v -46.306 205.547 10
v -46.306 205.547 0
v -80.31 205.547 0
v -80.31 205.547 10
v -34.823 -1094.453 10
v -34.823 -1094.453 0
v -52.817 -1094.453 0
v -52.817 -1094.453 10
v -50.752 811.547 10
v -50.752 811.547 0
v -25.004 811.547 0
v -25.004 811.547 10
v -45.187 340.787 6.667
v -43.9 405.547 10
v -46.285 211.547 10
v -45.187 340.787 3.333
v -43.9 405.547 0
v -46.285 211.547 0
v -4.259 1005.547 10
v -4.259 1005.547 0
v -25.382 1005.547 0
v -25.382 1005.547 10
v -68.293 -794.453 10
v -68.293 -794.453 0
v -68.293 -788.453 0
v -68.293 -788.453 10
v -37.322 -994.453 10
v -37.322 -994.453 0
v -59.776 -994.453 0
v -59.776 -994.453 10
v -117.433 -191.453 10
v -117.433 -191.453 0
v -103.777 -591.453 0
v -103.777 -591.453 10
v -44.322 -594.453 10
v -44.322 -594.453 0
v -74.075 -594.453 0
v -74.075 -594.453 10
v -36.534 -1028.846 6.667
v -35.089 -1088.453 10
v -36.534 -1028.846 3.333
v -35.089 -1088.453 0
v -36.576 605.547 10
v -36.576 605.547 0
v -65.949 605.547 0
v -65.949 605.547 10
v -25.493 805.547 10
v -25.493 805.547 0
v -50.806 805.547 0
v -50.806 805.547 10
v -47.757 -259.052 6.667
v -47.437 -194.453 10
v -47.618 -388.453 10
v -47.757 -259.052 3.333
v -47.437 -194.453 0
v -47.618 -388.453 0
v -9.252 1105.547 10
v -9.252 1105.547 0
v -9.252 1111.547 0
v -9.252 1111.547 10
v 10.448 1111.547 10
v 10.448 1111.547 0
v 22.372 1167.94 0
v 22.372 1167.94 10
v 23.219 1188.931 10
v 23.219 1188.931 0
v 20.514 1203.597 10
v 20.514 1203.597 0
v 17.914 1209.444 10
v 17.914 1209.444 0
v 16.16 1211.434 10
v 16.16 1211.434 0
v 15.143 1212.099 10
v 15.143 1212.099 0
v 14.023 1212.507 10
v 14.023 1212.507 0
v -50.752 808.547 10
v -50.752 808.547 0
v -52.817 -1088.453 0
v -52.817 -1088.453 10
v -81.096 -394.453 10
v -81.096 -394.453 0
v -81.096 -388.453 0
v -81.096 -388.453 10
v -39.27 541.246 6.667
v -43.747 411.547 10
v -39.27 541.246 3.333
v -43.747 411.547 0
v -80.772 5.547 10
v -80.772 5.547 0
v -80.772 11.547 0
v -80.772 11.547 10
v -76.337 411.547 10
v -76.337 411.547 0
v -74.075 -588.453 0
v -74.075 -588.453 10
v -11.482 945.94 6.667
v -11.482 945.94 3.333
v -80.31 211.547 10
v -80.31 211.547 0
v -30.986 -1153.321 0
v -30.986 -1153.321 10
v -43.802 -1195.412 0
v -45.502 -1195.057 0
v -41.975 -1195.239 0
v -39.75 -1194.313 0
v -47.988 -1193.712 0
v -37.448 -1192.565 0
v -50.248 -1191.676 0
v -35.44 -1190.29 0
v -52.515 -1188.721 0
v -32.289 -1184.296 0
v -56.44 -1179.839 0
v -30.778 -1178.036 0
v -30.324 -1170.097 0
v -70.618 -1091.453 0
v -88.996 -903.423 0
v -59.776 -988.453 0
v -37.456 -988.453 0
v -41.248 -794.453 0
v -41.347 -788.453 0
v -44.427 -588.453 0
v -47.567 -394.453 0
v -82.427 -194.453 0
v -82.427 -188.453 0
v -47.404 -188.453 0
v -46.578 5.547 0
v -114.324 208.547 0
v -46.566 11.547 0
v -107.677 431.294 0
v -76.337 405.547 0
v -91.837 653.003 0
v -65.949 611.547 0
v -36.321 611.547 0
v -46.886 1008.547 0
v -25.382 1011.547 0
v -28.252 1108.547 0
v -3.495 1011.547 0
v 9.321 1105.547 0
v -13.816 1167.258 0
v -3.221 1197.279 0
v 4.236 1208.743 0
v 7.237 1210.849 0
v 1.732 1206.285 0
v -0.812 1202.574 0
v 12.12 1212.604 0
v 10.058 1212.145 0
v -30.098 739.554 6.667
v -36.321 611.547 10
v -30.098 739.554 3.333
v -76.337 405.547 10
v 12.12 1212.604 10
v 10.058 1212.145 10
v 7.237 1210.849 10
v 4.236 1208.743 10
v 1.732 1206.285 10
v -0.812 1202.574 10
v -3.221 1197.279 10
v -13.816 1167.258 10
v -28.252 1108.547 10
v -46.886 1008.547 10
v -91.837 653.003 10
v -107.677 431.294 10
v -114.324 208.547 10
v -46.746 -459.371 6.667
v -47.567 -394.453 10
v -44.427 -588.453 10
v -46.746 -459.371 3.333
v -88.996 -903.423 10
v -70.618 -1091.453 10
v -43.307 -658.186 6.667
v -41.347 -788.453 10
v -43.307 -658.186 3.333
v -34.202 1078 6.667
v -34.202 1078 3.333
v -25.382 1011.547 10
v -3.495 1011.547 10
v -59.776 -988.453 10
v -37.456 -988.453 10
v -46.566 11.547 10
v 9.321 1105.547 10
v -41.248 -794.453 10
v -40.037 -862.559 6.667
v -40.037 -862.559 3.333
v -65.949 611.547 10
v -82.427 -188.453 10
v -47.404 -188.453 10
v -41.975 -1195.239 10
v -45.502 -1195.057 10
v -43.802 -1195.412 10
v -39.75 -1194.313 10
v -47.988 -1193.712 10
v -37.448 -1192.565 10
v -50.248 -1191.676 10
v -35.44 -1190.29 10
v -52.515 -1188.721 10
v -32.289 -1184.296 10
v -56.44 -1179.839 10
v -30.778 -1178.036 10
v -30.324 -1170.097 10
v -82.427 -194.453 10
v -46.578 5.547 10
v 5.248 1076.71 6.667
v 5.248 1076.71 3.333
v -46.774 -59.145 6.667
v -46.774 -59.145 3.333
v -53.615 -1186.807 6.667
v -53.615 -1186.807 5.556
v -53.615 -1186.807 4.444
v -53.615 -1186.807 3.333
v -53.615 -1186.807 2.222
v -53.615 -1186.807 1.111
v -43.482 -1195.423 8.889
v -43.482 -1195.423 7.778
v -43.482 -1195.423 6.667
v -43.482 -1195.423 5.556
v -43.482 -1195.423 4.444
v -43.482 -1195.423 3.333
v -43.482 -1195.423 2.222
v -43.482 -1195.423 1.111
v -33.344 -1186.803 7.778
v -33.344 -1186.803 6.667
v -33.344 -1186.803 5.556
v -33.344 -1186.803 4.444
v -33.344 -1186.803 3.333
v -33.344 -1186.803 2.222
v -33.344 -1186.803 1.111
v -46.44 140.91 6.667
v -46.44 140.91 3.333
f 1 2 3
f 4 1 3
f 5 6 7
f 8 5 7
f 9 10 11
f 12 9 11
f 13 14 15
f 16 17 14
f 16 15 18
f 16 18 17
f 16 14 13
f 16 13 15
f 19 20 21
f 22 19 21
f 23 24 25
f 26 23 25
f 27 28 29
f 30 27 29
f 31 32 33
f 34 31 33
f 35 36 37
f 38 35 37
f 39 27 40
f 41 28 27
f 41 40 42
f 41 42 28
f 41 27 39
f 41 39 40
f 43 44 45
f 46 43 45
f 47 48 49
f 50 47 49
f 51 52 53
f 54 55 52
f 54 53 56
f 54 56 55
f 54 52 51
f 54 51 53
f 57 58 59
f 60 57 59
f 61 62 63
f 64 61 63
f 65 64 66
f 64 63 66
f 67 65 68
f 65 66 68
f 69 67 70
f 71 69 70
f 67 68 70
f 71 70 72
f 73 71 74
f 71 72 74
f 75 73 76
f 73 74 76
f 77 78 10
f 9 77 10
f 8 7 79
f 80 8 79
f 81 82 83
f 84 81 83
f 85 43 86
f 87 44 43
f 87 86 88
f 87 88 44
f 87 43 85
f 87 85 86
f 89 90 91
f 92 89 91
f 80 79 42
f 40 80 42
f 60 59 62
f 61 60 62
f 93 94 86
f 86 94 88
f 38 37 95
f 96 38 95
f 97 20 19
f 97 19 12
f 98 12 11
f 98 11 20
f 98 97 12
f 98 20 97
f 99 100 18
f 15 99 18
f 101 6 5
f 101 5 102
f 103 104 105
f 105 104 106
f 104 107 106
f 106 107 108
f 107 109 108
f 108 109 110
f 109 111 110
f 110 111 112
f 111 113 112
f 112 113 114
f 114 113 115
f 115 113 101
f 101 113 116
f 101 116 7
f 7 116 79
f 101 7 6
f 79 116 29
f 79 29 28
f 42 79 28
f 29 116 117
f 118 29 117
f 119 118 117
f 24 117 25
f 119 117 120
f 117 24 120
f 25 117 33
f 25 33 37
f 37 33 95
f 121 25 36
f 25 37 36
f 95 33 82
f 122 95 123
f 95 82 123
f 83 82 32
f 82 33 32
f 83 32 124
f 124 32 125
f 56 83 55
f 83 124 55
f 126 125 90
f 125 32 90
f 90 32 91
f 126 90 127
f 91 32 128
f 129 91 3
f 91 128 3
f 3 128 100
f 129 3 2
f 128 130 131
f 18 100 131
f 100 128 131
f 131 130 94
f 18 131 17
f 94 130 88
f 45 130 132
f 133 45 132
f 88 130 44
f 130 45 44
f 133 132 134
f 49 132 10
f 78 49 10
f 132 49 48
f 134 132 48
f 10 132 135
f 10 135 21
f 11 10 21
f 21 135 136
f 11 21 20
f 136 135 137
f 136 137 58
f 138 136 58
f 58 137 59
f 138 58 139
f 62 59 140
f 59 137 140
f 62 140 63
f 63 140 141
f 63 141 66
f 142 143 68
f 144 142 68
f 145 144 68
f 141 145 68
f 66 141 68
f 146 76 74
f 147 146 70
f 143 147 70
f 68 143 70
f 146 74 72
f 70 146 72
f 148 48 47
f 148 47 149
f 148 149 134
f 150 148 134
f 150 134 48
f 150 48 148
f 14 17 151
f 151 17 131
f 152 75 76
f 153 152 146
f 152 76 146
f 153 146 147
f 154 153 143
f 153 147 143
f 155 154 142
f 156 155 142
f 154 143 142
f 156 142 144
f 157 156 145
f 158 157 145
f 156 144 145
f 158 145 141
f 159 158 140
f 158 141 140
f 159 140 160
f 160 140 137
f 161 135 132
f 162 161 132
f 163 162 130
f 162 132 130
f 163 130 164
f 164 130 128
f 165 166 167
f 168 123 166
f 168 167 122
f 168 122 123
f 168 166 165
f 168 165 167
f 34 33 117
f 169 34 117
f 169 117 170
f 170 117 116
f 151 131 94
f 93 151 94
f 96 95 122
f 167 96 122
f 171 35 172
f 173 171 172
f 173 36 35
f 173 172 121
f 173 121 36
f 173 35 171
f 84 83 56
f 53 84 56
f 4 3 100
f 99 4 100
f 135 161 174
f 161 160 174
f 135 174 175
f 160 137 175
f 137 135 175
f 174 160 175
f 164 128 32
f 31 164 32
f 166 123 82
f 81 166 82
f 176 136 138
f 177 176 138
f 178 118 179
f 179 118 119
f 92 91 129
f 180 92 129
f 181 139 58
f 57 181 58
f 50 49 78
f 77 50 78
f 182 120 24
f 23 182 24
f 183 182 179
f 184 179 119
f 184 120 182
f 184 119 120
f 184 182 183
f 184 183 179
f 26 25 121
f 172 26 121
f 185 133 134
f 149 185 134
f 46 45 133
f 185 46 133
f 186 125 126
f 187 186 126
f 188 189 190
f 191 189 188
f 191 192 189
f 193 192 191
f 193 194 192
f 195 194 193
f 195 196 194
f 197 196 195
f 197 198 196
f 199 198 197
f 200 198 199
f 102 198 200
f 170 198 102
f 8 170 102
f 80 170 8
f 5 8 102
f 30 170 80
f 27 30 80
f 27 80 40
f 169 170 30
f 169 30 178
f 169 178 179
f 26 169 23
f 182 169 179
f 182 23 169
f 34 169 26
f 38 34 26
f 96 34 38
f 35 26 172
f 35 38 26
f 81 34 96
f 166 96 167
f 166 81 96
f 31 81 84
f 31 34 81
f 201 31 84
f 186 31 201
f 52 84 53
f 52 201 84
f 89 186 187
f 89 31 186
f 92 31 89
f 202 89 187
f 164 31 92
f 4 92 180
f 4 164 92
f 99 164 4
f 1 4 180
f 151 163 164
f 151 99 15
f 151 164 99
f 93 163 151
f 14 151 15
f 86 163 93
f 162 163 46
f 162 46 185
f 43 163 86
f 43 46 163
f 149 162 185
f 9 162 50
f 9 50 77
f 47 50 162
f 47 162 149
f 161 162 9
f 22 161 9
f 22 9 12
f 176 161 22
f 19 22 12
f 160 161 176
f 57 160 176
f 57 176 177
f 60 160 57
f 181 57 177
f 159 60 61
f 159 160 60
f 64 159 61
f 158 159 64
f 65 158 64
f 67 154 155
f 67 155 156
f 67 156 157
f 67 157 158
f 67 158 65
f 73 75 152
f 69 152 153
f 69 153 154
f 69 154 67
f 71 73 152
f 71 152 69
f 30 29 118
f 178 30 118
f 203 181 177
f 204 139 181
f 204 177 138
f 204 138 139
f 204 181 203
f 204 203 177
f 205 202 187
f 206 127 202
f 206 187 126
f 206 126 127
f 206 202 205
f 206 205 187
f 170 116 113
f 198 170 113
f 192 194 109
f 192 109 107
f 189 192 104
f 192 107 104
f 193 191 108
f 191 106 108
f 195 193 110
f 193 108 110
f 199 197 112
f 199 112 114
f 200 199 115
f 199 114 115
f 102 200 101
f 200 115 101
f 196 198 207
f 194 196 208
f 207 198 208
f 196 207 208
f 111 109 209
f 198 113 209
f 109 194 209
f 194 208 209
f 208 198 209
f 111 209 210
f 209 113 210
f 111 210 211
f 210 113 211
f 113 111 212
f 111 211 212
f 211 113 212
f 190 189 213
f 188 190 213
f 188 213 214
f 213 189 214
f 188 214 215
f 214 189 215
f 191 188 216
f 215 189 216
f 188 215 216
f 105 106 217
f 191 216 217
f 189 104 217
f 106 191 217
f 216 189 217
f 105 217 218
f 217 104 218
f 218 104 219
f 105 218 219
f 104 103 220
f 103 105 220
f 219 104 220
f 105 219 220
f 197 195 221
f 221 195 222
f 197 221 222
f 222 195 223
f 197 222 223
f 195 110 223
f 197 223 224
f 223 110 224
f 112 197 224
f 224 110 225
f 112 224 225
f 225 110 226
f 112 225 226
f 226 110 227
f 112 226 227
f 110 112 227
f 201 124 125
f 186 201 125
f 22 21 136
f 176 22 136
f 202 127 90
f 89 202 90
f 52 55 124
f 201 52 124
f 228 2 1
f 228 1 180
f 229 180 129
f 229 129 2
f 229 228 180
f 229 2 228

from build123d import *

# Parameters (mm, degrees)
F1_DEPTH = 10


# Not quite as in the source:
# - a feature names something its author has since deleted; it is built from what else it names


with BuildPart() as f1:
    # F0 (on Top) → F1 (new body)
    with BuildSketch(Plane.XY):
        with BuildLine():
            Line((-9.2522319783, 1105.5465694817), (-9.2522319783, 1108.5465694817))
            Line((-9.2522319783, 1108.5465694817), (-28.2522319783, 1108.5465694817))
            add(Edge.make_bspline(
                [(-28.2522319783, 1108.5465694817), (-34.1692287273, 1078.3481872981), (-40.0862254764, 1048.1498051145), (-46.885506853, 1008.5465694817)],
                knots=[0, 0, 0, 0, 0.0623728759, 0.0623728759, 0.0623728759, 0.0623728759], degree=3))
            Line((-46.885506853, 1008.5465694817), (-25.3817387583, 1008.5465694817))
            Line((-25.3817387583, 1008.5465694817), (-25.3817387583, 1011.5465694817))
            Line((-25.3817387583, 1011.5465694817), (-3.4951998214, 1011.5465694817))
            add(Edge.make_bspline(
                [(9.3214260817, 1105.5465694817), (5.2778951966, 1077.0910022719), (1.2125502532, 1048.3609188135), (-3.4951998214, 1011.5465694817)],
                knots=[0.0020582204, 0.0020582204, 0.0020582204, 0.0020582204, 0.0606128099, 0.0606128099, 0.0606128099, 0.0606128099], degree=3))
            Line((9.3214260817, 1105.5465694817), (-9.2522319783, 1105.5465694817))
        make_face()
        with BuildLine():
            Line((-28.2522319783, 1108.5465694817), (-9.2522319783, 1108.5465694817))
            Line((-9.2522319783, 1108.5465694817), (-9.2522319783, 1111.5465694817))
            Line((-9.2522319783, 1111.5465694817), (10.4483753261, 1111.5465694817))
            add(Edge.make_bspline(
                [(10.4483753261, 1111.5465694817), (14.2237569857, 1127.7176279013), (20.7843357368, 1156.0283342705), (24.50141426, 1181.1497468298), (21.913351831, 1202.3721726285), (17.2535020339, 1211.7645420112), (14.0231014783, 1212.5065694817)],
                knots=[0.0100141442, 0.0100141442, 0.0100141442, 0.0100141442, 0.1720322765, 0.2970501568, 0.4103591472, 0.4934759383, 0.4934759383, 0.4934759383, 0.4934759383], degree=3))
            add(Edge.make_bspline(
                [(14.0231014783, 1212.5065694817), (10.6916463361, 1213.2718093304), (0.9849483202, 1207.717065294), (-4.4652508998, 1194.4970040922), (-17.4495437423, 1158.8703779353), (-24.4328369098, 1126.3390394336), (-28.2522319783, 1108.5465694817)],
                knots=[0.4934759383, 0.4934759383, 0.4934759383, 0.4934759383, 0.5791928197, 0.6716390479, 0.8204084848, 1, 1, 1, 1], degree=3))
        make_face()
        with BuildLine():
            Line((-25.3817387583, 1008.5465694817), (-46.885506853, 1008.5465694817))
            add(Edge.make_bspline(
                [(-46.885506853, 1008.5465694817), (-56.4704307745, 952.7180223817), (-67.8086700034, 878.1997316325), (-76.2546409025, 808.5465694817)],
                knots=[0.0623728759, 0.0623728759, 0.0623728759, 0.0623728759, 0.1502997077, 0.1502997077, 0.1502997077, 0.1502997077], degree=3))
            Line((-76.2546409025, 808.5465694817), (-50.7523337375, 808.5465694817))
            Line((-50.7523337375, 808.5465694817), (-50.7523337375, 811.5465694817))
            Line((-50.7523337375, 811.5465694817), (-25.0042987138, 811.5465694817))
            add(Edge.make_bspline(
                [(-4.2590252459, 1005.5465694817), (-11.1919357354, 950.8419950912), (-19.4396527515, 879.0589079331), (-25.0042987138, 811.5465694817)],
                knots=[0.0637563334, 0.0637563334, 0.0637563334, 0.0637563334, 0.1487347177, 0.1487347177, 0.1487347177, 0.1487347177], degree=3))
            Line((-4.2590252459, 1005.5465694817), (-25.3817387583, 1005.5465694817))
            Line((-25.3817387583, 1005.5465694817), (-25.3817387583, 1008.5465694817))
        make_face()
        with BuildLine():
            Line((-50.7523337375, 808.5465694817), (-76.2546409025, 808.5465694817))
            add(Edge.make_bspline(
                [(-76.2546409025, 808.5465694817), (-84.6749646264, 739.1049172777), (-90.2205587707, 674.4988914733), (-95.4501271993, 608.5465694817)],
                knots=[0.1502997077, 0.1502997077, 0.1502997077, 0.1502997077, 0.2379595395, 0.2379595395, 0.2379595395, 0.2379595395], degree=3))
            Line((-95.4501271993, 608.5465694817), (-65.9492915816, 608.5465694817))
            Line((-65.9492915816, 608.5465694817), (-65.9492915816, 611.5465694817))
            Line((-65.9492915816, 611.5465694817), (-36.3208296657, 611.5465694817))
            add(Edge.make_bspline(
                [(-25.492600007, 805.5470480317), (-30.8991386303, 738.261256599), (-33.600522451, 675.484027067), (-36.3208296657, 611.5465694817)],
                knots=[0.1512568673, 0.1512568673, 0.1512568673, 0.1512568673, 0.2362855612, 0.2362855612, 0.2362855612, 0.2362855612], degree=3))
            Line((-25.492600007, 805.5470480317), (-50.8059161147, 805.5470480317))
            Line((-50.8059161147, 805.5470480317), (-50.7523337375, 808.5465694817))
        make_face()
        with BuildLine():
            Line((-65.9492915816, 608.5465694817), (-95.4501271993, 608.5465694817))
            add(Edge.make_bspline(
                [(-95.4501271993, 608.5465694817), (-100.6735657013, 542.6715546134), (-105.5817189232, 475.4533978756), (-108.8488180837, 408.5465694817)],
                knots=[0.2379595395, 0.2379595395, 0.2379595395, 0.2379595395, 0.3255166193, 0.3255166193, 0.3255166193, 0.3255166193], degree=3))
            Line((-108.8488180837, 408.5465694817), (-76.3366638949, 408.5465694817))
            Line((-76.3366638949, 408.5465694817), (-76.3366638949, 411.5465694817))
            Line((-76.3366638949, 411.5465694817), (-43.7472965242, 411.5465694817))
            add(Edge.make_bspline(
                [(-36.576081022, 605.5465694817), (-39.2965672487, 541.5968769288), (-42.0608997966, 476.4245488132), (-43.7472965243, 411.5465694817)],
                knots=[0.2389437345, 0.2389437345, 0.2389437345, 0.2389437345, 0.3238872962, 0.3238872962, 0.3238872962, 0.3238872962], degree=3))
            Line((-36.576081022, 605.5465694817), (-65.9492915816, 605.5465694817))
            Line((-65.9492915816, 605.5465694817), (-65.9492915816, 608.5465694817))
        make_face()
        with BuildLine():
            Line((-76.3366638949, 408.5465694817), (-108.8488180837, 408.5465694817))
            add(Edge.make_bspline(
                [(-108.8488180837, 408.5465694817), (-112.112873039, 341.7020832768), (-113.7389306982, 275.1683455095), (-114.3242902488, 208.5465694817)],
                knots=[0.3255166193, 0.3255166193, 0.3255166193, 0.3255166193, 0.4129921155, 0.4129921155, 0.4129921155, 0.4129921155], degree=3))
            Line((-114.3242902488, 208.5465694817), (-80.310060953, 208.5465694817))
            Line((-80.310060953, 208.5465694817), (-80.310060953, 211.5465694817))
            Line((-80.310060953, 211.5465694817), (-46.2853714025, 211.5465694817))
            add(Edge.make_bspline(
                [(-43.9001795453, 405.5465694817), (-45.519256644, 340.6971675299), (-46.0554016999, 276.1594412286), (-46.2853714025, 211.5465694817)],
                knots=[0.3265062426, 0.3265062426, 0.3265062426, 0.3265062426, 0.4114374445, 0.4114374445, 0.4114374445, 0.4114374445], degree=3))
            Line((-43.9001795453, 405.5465694817), (-76.3366638949, 405.5465694817))
            Line((-76.3366638949, 405.5465694817), (-76.3366638949, 408.5465694817))
        make_face()
        with BuildLine():
            Line((-80.310060953, 208.5465694817), (-114.3242902488, 208.5465694817))
            add(Edge.make_bspline(
                [(-114.3242902488, 208.5465694817), (-114.9095417049, 141.9370960513), (-114.4544793743, 75.2396168723), (-114.9729122534, 8.5465694817)],
                knots=[0.4129921155, 0.4129921155, 0.4129921155, 0.4129921155, 0.5004514582, 0.5004514582, 0.5004514582, 0.5004514582], degree=3))
            Line((-114.9729122534, 8.5465694817), (-80.772249135, 8.5465694817))
            Line((-80.772249135, 8.5465694817), (-80.772249135, 11.5465694817))
            Line((-80.772249135, 11.5465694817), (-46.5657327214, 11.5465694817))
            add(Edge.make_bspline(
                [(-46.3058677148, 205.5465694817), (-46.517541999, 140.9336478574), (-46.4426078998, 76.2408210046), (-46.5657327214, 11.5465694817)],
                knots=[0.4140662707, 0.4140662707, 0.4140662707, 0.4140662707, 0.4989910833, 0.4989910833, 0.4989910833, 0.4989910833], degree=3))
            Line((-46.3058677148, 205.5465694817), (-80.310060953, 205.5465694817))
            Line((-80.310060953, 205.5465694817), (-80.310060953, 208.5465694817))
        make_face()
        with BuildLine():
            Line((-80.772249135, 8.5465694817), (-114.9729122534, 8.5465694817))
            add(Edge.make_bspline(
                [(-114.9729122534, 8.5465694817), (-115.4913633728, -58.1488243975), (-116.9833782047, -124.8397861765), (-117.4326707445, -191.4534305183)],
                knots=[0.5004514582, 0.5004514582, 0.5004514582, 0.5004514582, 0.587913878, 0.587913878, 0.587913878, 0.587913878], degree=3))
            Line((-117.4326707445, -191.4534305183), (-82.4265356335, -191.4534305183))
            Line((-82.4265356335, -191.4534305183), (-82.4265356335, -188.4534305183))
            Line((-82.4265356335, -188.4534305183), (-47.4040323866, -188.4534305183))
            add(Edge.make_bspline(
                [(-46.5777314963, 5.5465694817), (-46.7134050172, -59.1479448978), (-47.0517150176, -123.8414273541), (-47.4040323866, -188.4534305183)],
                knots=[0.5016165032, 0.5016165032, 0.5016165032, 0.5016165032, 0.5865416442, 0.5865416442, 0.5865416442, 0.5865416442], degree=3))
            Line((-46.5777314963, 5.5465694817), (-80.772249135, 5.5465694817))
            Line((-80.772249135, 5.5465694817), (-80.772249135, 8.5465694817))
        make_face()
        with BuildLine():
            Line((-82.4265356335, -191.4534305183), (-117.4326707445, -191.4534305183))
            add(Edge.make_bspline(
                [(-117.4326707445, -191.4534305183), (-117.8819688578, -258.0679012195), (-117.2885188084, -324.6050525653), (-114.5979590791, -391.4534305183)],
                knots=[0.587913878, 0.587913878, 0.587913878, 0.587913878, 0.6753773828, 0.6753773828, 0.6753773828, 0.6753773828], degree=3))
            Line((-114.5979590791, -391.4534305183), (-81.0956338475, -391.4534305183))
            Line((-81.0956338475, -391.4534305183), (-81.0956338475, -388.4534305183))
            Line((-81.0956338475, -388.4534305183), (-47.6180785507, -388.4534305183))
            add(Edge.make_bspline(
                [(-47.4367827083, -194.4534305183), (-47.7896354912, -259.0626621028), (-48.1401096643, -323.5953829529), (-47.6180785507, -388.4534305183)],
                knots=[0.58917052, 0.58917052, 0.58917052, 0.58917052, 0.6740985981, 0.6740985981, 0.6740985981, 0.6740985981], degree=3))
            Line((-47.4367827083, -194.4534305183), (-82.4265356335, -194.4534305183))
            Line((-82.4265356335, -194.4534305183), (-82.4265356335, -191.4534305183))
        make_face()
        with BuildLine():
            Line((-81.0956338475, -391.4534305183), (-114.5979590791, -391.4534305183))
            add(Edge.make_bspline(
                [(-114.5979590791, -391.4534305183), (-111.9055675807, -458.347319741), (-107.1132099499, -525.5528594896), (-103.7767332928, -591.4534305183)],
                knots=[0.6753773828, 0.6753773828, 0.6753773828, 0.6753773828, 0.762900434, 0.762900434, 0.762900434, 0.762900434], degree=3))
            Line((-103.7767332928, -591.4534305183), (-74.0754674311, -591.4534305183))
            Line((-74.0754674311, -591.4534305183), (-74.0754674311, -588.4534305183))
            Line((-74.0754674311, -588.4534305183), (-44.426569062, -588.4534305183))
            add(Edge.make_bspline(
                [(-47.5672869388, -394.4534305183), (-46.9911709166, -459.3253273899), (-45.5476453008, -524.5049596078), (-44.426569062, -588.4534305183)],
                knots=[0.6767170821, 0.6767170821, 0.6767170821, 0.6767170821, 0.7616371329, 0.7616371329, 0.7616371329, 0.7616371329], degree=3))
            Line((-47.5672869388, -394.4534305183), (-81.0956338475, -394.4534305183))
            Line((-81.0956338475, -394.4534305183), (-81.0956338475, -391.4534305183))
        make_face()
        with BuildLine():
            Line((-74.0754674311, -591.4534305183), (-103.7767332928, -591.4534305183))
            add(Edge.make_bspline(
                [(-103.7767332928, -591.4534305183), (-100.4411938204, -657.3354907033), (-98.5607175504, -721.913315172), (-95.2888672995, -791.4534305183)],
                knots=[0.762900434, 0.762900434, 0.762900434, 0.762900434, 0.8503989007, 0.8503989007, 0.8503989007, 0.8503989007], degree=3))
            Line((-95.2888672995, -791.4534305183), (-68.2934120383, -791.4534305183))
            Line((-68.2934120383, -791.4534305183), (-68.2934120383, -788.4534305183))
            Line((-68.2934120383, -788.4534305183), (-41.3473226027, -788.4534305183))
            add(Edge.make_bspline(
                [(-44.3222964296, -594.4534305183), (-43.2214963704, -658.360909415), (-42.4517270587, -721.1021087734), (-41.3473226027, -788.4534305183)],
                knots=[0.7642946324, 0.7642946324, 0.7642946324, 0.7642946324, 0.8492622563, 0.8492622563, 0.8492622563, 0.8492622563], degree=3))
            Line((-44.3222964296, -594.4534305183), (-74.0754674311, -594.4534305183))
            Line((-74.0754674311, -594.4534305183), (-74.0754674311, -591.4534305183))
        make_face()
        with BuildLine():
            Line((-68.2934120383, -791.4534305183), (-95.2888672995, -791.4534305183))
            add(Edge.make_bspline(
                [(-95.2888672995, -791.4534305183), (-92.0149726534, -861.0369975725), (-87.3479647004, -935.5890587547), (-82.1628302646, -991.4534305183)],
                knots=[0.8503989007, 0.8503989007, 0.8503989007, 0.8503989007, 0.9379520403, 0.9379520403, 0.9379520403, 0.9379520403], degree=3))
            Line((-82.1628302646, -991.4534305183), (-59.7760454191, -991.4534305183))
            Line((-59.7760454191, -991.4534305183), (-59.7760454191, -988.4534305183))
            Line((-59.7760454191, -988.4534305183), (-37.4559647617, -988.4534305183))
            add(Edge.make_bspline(
                [(-41.2482418592, -794.4534305183), (-40.1266287573, -861.9004781348), (-38.6708390195, -933.7012026364), (-37.4559647617, -988.4534305183)],
                knots=[0.8517802395, 0.8517802395, 0.8517802395, 0.8517802395, 0.9365259774, 0.9365259774, 0.9365259774, 0.9365259774], degree=3))
            Line((-41.2482418592, -794.4534305183), (-68.2934120383, -794.4534305183))
            Line((-68.2934120383, -794.4534305183), (-68.2934120383, -791.4534305183))
        make_face()
        with BuildLine():
            Line((-59.7760454191, -991.4534305183), (-82.1628302646, -991.4534305183))
            add(Edge.make_bspline(
                [(-82.1628302646, -991.4534305183), (-78.4881817721, -1031.0439044063), (-74.5533092769, -1061.2486674623), (-70.6184367817, -1091.4534305183)],
                knots=[0.9379520403, 0.9379520403, 0.9379520403, 0.9379520403, 1, 1, 1, 1], degree=3))
            Line((-70.6184367817, -1091.4534305183), (-52.8165805825, -1091.4534305183))
            Line((-52.8165805825, -1091.4534305183), (-52.8165805825, -1088.4534305183))
            Line((-52.8165805825, -1088.4534305183), (-35.0888296498, -1088.4534305183))
            add(Edge.make_bspline(
                [(-37.322275987, -994.4534305183), (-36.4991726981, -1031.2396183628), (-35.7920332849, -1059.9830094592), (-35.0888296498, -1088.4534305183)],
                knots=[0.9396580371, 0.9396580371, 0.9396580371, 0.9396580371, 0.9979520124, 0.9979520124, 0.9979520124, 0.9979520124], degree=3))
            Line((-37.322275987, -994.4534305183), (-59.7760454191, -994.4534305183))
            Line((-59.7760454191, -994.4534305183), (-59.7760454191, -991.4534305183))
        make_face()
        with BuildLine():
            Line((-52.8165805825, -1091.4534305183), (-70.6184367817, -1091.4534305183))
            add(Edge.make_bspline(
                [(-70.6184367817, -1091.4534305183), (-67.9110233409, -1108.1005244006), (-63.3619889151, -1136.0712074231), (-62.8084472686, -1156.7636726537), (-56.9392429668, -1179.8854765827), (-52.0402683291, -1190.8912220635), (-43.8780764691, -1197.1956346468), (-35.6928205779, -1192.113746687), (-30.7731194715, -1181.9886543329), (-30.0475473892, -1169.6607279781), (-30.6576558665, -1159.033327889), (-30.985580365, -1153.3212537692)],
                knots=[0, 0, 0, 0, 0.1863834872, 0.3131641762, 0.4452842877, 0.5417120225, 0.6219151427, 0.7001120149, 0.7912063967, 0.8877764526, 1, 1, 1, 1], degree=3))
            add(Edge.make_bspline(
                [(-34.8233472068, -1094.4534305183), (-34.257564492, -1103.3212790556), (-33.0345610691, -1122.4536049764), (-31.700057419, -1142.5577425607), (-30.985580365, -1153.3212537692)],
                knots=[0.049793057, 0.049793057, 0.049793057, 0.049793057, 0.4912707377, 1, 1, 1, 1], degree=3))
            Line((-34.8233472068, -1094.4534305183), (-52.8165805825, -1094.4534305183))
            Line((-52.8165805825, -1094.4534305183), (-52.8165805825, -1091.4534305183))
        make_face()
    extrude(amount=F1_DEPTH)


solid = f1.part
